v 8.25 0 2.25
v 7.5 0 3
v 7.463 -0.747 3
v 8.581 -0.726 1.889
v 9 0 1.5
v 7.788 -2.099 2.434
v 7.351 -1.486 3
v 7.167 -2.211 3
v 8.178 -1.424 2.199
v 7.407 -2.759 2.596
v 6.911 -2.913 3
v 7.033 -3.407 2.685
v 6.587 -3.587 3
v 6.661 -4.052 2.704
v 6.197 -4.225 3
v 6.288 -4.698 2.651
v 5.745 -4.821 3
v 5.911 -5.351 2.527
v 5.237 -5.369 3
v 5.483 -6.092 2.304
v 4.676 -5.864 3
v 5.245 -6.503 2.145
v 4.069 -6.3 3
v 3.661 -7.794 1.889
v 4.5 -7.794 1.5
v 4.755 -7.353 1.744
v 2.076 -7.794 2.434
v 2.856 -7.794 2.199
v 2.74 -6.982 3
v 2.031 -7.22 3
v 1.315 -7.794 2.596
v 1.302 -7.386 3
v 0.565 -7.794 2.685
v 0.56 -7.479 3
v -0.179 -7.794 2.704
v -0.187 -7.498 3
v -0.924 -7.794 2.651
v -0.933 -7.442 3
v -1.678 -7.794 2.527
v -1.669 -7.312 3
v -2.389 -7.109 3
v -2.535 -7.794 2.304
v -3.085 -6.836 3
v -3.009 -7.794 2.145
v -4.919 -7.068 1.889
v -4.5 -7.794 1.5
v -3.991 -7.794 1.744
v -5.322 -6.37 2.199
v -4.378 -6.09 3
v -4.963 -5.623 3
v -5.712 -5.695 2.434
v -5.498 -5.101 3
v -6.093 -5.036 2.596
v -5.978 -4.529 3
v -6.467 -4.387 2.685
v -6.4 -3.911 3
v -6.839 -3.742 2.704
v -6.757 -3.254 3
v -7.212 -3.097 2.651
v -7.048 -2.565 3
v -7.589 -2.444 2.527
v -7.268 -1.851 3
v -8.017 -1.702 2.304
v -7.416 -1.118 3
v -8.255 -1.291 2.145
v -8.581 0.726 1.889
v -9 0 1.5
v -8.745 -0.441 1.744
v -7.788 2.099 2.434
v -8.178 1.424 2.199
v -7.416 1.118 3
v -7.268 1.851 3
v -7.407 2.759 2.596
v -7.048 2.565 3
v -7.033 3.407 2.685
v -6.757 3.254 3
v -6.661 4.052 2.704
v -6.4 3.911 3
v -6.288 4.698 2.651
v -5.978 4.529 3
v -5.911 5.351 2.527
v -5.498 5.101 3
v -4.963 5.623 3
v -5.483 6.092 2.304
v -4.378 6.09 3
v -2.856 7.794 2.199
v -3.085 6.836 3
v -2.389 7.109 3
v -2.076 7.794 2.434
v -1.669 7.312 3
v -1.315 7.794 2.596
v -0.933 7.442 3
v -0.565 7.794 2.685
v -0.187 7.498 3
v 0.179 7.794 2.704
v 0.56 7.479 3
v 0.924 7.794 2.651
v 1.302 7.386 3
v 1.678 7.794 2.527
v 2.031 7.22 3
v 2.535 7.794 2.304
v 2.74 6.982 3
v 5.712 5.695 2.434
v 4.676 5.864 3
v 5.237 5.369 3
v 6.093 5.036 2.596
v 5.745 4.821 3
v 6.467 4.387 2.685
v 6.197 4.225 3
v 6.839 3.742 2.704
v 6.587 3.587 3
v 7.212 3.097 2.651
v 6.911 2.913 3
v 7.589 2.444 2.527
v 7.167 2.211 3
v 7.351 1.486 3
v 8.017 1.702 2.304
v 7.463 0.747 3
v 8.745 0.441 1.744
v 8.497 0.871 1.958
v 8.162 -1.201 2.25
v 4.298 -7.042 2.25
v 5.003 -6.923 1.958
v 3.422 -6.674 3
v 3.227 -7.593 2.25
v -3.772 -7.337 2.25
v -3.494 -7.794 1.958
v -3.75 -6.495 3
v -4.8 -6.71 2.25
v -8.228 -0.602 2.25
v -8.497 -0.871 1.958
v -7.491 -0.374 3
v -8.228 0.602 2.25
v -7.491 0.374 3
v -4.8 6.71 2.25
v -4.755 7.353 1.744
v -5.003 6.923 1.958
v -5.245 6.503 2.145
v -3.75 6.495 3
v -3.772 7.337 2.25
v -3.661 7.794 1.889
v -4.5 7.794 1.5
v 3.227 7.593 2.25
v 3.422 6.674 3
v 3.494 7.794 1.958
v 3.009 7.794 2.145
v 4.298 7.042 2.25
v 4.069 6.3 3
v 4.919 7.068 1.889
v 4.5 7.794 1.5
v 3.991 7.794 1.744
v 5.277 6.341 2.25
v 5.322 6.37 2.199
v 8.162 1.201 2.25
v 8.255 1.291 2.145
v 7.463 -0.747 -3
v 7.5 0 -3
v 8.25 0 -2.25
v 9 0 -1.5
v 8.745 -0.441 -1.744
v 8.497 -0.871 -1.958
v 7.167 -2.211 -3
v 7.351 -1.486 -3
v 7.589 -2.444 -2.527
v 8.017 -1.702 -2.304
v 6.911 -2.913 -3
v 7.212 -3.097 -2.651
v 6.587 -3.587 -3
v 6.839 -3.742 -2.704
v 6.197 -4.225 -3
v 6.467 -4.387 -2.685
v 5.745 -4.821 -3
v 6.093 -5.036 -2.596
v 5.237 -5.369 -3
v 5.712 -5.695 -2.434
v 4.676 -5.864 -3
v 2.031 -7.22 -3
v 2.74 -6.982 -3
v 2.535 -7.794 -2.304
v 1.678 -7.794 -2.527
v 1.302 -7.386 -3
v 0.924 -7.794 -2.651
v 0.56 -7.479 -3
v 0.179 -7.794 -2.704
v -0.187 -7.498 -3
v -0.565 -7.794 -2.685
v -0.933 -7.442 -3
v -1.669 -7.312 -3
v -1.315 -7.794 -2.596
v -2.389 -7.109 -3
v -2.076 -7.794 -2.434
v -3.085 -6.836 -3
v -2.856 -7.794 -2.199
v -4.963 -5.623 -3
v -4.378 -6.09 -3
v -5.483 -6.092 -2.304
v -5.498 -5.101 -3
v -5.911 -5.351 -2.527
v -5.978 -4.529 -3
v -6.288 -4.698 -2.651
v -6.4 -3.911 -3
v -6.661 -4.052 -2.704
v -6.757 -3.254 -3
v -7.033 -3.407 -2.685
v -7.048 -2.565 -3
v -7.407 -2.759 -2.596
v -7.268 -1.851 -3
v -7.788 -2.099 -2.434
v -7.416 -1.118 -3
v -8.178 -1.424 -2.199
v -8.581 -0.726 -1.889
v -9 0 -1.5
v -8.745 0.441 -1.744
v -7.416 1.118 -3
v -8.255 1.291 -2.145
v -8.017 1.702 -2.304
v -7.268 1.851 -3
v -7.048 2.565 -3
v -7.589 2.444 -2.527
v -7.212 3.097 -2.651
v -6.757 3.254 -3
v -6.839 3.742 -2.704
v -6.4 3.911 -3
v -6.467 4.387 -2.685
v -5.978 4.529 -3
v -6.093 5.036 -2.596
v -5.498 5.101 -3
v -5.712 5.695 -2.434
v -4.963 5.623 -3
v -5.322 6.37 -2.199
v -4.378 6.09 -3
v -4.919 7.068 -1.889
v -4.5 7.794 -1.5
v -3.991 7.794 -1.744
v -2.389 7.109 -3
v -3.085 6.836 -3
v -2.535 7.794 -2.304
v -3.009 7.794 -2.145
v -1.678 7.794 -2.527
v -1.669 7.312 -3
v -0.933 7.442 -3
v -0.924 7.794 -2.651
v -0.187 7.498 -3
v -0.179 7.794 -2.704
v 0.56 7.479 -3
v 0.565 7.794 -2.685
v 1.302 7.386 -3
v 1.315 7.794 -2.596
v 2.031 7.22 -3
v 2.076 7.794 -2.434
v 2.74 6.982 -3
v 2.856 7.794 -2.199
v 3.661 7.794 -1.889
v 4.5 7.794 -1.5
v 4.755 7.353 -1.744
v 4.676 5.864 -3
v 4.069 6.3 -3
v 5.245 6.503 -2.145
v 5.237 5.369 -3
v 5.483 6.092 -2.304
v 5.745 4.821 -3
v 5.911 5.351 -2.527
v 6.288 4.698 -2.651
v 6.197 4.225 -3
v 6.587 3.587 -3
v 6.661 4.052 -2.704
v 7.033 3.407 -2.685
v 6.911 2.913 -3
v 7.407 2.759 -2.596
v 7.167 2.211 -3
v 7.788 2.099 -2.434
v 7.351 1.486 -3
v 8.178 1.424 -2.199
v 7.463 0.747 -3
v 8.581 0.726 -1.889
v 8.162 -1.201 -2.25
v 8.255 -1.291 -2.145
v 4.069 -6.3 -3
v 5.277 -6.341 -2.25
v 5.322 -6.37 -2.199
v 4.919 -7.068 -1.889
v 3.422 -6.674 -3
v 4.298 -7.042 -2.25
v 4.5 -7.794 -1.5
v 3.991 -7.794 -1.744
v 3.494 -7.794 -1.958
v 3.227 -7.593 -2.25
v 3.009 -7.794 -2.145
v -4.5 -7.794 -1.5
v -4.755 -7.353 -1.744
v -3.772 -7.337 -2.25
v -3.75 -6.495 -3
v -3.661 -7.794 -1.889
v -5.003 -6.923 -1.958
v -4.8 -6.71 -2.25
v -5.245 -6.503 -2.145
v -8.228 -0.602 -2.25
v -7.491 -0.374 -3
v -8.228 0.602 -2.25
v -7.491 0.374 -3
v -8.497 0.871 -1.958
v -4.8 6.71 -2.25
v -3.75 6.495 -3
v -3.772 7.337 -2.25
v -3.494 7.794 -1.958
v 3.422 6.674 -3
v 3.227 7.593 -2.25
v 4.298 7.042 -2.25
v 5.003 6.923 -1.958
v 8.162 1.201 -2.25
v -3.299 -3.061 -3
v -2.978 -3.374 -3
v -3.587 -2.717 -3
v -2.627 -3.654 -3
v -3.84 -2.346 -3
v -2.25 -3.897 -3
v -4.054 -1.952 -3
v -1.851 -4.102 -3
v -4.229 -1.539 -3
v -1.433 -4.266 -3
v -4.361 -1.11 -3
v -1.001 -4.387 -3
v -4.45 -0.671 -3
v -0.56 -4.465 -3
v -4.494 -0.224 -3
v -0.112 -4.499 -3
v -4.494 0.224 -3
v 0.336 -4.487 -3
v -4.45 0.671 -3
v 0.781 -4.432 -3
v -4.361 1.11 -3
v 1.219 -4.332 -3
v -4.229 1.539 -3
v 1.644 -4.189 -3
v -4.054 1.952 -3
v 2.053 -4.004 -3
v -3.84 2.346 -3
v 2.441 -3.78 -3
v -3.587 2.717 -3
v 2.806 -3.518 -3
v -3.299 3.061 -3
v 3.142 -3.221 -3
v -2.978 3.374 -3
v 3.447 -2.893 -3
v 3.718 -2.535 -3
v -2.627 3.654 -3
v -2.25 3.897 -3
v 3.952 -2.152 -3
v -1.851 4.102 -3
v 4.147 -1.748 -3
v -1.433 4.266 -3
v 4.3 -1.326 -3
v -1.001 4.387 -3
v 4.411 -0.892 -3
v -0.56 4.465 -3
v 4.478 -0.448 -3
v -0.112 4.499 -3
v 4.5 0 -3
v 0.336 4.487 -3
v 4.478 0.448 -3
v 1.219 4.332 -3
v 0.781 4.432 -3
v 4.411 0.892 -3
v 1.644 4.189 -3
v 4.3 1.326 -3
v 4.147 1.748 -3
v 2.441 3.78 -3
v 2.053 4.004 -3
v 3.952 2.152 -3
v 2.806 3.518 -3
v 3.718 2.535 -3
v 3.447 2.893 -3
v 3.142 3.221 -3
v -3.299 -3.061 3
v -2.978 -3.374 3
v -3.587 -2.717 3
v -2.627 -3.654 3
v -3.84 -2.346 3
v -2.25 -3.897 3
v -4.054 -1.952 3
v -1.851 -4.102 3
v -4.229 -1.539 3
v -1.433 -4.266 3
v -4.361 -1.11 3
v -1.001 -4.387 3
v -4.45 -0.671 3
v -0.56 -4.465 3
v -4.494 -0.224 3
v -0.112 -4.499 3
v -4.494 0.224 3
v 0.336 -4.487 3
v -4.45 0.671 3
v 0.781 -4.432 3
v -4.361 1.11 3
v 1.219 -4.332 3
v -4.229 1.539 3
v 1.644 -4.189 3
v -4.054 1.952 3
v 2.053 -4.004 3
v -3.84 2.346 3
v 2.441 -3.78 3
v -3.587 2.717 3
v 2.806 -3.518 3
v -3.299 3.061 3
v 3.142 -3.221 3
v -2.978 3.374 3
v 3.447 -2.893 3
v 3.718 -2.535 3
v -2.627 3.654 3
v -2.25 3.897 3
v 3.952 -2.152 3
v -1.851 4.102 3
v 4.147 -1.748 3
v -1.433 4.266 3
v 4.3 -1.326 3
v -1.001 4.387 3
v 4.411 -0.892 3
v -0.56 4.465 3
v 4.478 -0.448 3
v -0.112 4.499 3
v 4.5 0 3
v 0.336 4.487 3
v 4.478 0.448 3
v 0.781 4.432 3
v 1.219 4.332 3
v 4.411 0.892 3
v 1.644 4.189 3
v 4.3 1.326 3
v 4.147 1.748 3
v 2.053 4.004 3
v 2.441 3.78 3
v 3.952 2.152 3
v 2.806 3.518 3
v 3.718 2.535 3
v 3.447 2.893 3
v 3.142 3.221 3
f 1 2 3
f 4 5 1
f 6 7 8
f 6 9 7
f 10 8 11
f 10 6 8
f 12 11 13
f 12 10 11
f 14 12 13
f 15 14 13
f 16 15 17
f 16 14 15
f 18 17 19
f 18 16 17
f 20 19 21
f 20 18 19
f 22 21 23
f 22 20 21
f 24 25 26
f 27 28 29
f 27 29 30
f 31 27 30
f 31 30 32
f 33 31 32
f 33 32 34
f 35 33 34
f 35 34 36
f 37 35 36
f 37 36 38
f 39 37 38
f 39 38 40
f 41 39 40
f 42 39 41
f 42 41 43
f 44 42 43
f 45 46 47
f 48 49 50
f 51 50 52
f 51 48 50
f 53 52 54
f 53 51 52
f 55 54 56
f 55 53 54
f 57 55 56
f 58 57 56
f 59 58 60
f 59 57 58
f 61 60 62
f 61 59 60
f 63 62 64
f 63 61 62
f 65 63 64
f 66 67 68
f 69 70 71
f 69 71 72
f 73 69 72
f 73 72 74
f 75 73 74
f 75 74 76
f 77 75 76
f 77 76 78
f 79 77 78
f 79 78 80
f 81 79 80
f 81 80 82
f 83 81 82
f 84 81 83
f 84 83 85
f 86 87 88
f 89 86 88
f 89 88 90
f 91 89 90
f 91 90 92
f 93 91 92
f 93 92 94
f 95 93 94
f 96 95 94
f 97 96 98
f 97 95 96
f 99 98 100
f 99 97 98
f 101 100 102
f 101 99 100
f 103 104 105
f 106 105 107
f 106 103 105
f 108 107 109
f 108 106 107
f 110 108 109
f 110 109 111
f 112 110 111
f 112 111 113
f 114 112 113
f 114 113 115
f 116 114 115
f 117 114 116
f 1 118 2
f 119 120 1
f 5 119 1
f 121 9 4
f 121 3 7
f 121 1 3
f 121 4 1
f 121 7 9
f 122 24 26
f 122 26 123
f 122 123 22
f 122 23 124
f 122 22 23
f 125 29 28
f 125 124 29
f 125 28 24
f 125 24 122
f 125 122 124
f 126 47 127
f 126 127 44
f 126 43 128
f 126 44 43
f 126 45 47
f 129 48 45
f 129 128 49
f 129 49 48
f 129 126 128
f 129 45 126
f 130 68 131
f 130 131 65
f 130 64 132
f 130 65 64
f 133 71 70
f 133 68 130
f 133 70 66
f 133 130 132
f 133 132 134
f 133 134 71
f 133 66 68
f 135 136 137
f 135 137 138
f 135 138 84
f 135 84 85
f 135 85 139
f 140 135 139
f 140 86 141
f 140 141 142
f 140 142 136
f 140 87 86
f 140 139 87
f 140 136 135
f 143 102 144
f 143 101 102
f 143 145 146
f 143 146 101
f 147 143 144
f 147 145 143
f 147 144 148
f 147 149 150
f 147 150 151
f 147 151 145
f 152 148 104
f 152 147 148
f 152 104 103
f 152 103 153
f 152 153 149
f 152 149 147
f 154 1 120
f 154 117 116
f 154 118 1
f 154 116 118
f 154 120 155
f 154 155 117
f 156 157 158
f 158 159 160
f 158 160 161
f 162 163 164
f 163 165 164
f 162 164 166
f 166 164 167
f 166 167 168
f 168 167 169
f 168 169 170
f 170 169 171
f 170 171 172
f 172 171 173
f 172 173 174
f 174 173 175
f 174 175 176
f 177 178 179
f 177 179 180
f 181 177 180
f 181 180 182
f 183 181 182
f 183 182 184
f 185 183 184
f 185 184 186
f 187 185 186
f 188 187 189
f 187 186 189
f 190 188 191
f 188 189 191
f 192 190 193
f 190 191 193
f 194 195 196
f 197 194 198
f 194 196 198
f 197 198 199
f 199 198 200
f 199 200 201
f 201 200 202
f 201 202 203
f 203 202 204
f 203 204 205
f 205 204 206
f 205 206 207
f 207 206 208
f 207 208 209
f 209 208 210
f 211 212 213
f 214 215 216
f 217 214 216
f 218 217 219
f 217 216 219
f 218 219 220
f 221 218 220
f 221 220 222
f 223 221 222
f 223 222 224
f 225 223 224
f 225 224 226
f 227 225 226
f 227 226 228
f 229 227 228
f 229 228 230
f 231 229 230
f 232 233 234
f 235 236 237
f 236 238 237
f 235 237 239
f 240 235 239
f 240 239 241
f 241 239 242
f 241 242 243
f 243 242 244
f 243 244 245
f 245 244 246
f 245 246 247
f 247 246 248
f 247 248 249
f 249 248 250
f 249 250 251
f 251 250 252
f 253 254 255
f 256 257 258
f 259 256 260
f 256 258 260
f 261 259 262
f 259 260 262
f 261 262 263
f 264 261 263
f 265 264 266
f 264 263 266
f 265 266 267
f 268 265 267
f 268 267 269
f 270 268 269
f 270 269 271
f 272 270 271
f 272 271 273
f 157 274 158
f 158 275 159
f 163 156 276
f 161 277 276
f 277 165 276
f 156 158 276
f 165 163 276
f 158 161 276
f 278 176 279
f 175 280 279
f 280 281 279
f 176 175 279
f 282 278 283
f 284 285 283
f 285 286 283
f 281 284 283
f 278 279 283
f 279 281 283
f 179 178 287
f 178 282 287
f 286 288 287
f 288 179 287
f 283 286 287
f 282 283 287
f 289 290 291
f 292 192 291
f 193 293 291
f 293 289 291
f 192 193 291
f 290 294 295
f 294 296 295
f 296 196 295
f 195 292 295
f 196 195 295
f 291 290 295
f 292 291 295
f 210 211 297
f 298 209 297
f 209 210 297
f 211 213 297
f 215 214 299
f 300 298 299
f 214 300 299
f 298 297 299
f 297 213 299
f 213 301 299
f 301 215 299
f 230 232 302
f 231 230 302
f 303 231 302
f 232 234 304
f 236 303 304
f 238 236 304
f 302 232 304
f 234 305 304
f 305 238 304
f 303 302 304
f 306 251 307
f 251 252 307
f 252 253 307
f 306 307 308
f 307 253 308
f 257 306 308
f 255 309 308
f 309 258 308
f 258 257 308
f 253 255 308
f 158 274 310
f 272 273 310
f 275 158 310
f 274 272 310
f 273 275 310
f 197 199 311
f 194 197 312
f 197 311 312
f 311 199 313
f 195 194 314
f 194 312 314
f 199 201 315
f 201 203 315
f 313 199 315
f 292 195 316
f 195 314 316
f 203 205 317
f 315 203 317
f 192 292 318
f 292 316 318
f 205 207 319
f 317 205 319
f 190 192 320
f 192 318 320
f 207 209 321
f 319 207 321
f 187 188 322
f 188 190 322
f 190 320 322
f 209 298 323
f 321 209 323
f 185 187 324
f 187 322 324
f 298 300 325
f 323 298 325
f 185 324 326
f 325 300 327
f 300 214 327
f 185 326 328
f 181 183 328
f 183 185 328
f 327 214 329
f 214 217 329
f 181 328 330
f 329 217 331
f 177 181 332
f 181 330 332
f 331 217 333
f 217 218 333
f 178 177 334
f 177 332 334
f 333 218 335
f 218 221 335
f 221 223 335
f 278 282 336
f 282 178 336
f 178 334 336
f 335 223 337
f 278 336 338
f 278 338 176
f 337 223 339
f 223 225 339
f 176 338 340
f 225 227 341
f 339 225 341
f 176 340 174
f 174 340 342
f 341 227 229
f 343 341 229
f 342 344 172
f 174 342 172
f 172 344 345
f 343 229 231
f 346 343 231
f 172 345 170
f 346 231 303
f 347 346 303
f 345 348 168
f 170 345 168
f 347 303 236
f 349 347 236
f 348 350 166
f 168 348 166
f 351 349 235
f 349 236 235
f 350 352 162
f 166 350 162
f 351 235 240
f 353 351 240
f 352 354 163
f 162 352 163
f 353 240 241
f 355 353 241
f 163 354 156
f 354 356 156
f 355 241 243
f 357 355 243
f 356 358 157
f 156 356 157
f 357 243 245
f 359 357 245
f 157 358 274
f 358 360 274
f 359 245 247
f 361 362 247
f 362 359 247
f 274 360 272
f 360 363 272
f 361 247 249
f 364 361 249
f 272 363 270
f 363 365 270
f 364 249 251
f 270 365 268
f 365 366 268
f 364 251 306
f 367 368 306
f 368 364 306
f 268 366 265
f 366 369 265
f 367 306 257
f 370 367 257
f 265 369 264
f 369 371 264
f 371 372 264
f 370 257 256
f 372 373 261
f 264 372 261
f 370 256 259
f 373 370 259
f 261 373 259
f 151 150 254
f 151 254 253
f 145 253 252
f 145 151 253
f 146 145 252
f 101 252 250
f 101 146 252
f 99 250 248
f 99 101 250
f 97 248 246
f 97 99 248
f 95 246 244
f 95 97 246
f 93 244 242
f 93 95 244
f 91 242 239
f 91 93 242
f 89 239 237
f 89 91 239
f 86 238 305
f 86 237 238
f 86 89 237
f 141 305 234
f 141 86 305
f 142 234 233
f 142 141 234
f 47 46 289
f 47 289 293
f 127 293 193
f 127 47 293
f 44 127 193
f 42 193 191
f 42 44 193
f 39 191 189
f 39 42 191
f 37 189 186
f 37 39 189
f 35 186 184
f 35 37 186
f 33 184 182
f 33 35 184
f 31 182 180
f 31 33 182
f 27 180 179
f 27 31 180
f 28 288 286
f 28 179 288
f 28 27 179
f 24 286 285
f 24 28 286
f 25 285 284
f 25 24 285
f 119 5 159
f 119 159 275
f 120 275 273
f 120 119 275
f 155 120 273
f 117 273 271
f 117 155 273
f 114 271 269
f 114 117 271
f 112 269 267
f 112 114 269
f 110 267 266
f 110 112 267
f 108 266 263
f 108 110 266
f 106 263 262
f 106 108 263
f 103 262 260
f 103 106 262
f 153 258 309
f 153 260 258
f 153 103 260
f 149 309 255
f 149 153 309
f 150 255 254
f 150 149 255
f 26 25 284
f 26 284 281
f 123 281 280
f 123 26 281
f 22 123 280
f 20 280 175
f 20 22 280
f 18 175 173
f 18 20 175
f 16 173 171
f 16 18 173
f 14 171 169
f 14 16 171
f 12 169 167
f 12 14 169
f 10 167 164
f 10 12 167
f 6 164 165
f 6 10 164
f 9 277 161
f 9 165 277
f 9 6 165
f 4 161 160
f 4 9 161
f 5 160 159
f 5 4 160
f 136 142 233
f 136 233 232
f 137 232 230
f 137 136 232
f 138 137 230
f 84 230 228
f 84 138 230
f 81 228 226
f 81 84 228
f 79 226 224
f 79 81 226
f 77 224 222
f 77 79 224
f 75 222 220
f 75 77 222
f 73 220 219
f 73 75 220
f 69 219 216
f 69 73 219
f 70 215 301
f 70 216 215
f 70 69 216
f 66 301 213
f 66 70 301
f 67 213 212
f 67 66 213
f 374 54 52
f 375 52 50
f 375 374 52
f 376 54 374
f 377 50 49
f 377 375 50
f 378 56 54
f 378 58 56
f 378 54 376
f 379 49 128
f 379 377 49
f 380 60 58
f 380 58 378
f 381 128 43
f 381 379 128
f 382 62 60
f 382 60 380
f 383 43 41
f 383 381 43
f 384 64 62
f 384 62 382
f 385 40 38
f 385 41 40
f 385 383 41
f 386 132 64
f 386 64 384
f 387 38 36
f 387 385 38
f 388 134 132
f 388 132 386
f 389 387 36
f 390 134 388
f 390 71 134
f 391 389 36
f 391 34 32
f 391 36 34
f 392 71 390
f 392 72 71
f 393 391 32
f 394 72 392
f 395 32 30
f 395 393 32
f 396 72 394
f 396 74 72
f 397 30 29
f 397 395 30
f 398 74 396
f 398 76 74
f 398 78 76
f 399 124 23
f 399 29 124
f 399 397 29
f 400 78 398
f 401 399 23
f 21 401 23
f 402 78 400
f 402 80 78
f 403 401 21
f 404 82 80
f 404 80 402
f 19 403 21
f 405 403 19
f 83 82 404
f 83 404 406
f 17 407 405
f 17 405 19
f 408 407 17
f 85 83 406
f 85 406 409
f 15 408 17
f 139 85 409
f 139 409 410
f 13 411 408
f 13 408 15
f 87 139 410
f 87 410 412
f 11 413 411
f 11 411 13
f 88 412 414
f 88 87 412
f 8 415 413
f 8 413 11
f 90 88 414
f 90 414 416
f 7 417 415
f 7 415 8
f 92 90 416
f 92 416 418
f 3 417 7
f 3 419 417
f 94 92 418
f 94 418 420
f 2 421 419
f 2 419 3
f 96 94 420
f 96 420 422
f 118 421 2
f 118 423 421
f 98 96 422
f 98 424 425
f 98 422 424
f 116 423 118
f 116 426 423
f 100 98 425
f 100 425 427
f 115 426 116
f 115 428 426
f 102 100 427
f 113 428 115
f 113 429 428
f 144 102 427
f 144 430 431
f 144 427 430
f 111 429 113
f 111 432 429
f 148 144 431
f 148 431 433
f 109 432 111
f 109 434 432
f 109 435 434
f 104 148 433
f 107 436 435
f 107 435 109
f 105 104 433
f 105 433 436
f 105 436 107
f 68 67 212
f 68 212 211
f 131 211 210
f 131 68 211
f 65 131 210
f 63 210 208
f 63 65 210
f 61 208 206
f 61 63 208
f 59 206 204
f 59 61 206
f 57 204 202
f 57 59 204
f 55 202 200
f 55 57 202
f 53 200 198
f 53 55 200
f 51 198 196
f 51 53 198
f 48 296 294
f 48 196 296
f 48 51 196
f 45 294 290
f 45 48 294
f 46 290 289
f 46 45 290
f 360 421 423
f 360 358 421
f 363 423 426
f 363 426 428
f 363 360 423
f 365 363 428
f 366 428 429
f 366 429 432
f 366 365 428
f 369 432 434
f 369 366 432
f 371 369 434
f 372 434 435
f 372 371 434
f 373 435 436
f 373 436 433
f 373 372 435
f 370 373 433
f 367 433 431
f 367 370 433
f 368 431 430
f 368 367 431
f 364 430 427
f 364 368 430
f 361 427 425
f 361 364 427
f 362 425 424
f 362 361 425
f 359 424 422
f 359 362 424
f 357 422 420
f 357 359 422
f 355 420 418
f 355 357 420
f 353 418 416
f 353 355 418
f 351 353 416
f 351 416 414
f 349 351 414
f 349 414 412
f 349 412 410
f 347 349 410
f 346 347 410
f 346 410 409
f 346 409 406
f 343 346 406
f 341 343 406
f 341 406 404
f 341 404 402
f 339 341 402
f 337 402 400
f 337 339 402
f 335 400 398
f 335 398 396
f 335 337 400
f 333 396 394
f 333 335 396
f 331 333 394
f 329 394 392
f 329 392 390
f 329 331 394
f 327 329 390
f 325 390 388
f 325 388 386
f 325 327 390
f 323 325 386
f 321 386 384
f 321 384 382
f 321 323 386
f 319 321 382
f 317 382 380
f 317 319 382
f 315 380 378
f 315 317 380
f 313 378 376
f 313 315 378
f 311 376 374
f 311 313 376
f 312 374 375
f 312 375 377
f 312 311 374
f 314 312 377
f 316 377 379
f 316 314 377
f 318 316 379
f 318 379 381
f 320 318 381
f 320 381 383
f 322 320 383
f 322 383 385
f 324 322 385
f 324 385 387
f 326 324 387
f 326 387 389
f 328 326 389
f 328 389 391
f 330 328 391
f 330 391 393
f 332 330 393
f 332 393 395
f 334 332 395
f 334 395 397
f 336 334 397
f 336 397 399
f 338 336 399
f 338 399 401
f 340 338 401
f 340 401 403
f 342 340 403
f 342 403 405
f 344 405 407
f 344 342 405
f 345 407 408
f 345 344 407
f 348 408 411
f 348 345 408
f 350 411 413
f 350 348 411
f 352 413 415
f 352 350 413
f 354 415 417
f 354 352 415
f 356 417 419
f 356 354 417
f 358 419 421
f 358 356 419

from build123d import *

# Parameters (mm, degrees)
SKETCH1_R           = 4.5
BOSS_EXTRUDE1_DEPTH = 3
SKETCH4_OUTSIDE_W   = 36.912
SKETCH4_OUTSIDE_H   = 34.5
SKETCH4_OUTSIDE_R   = 7.5
CUT_EXTRUDE1_DEPTH  = 6
CUT_EXTRUDE1_TAPER  = 45


with BuildPart() as part:
    # Sketch1 → Boss-Extrude1 (new body, symmetric)
    with BuildSketch(Plane.XY):
        Polygon((4.5, 7.794228634), (-4.5, 7.794228634), (-9, 0), (-4.5, -7.794228634), (4.5, -7.794228634), (9, 0), align=None)
        Circle(SKETCH1_R, mode=Mode.SUBTRACT)
    extrude(amount=BOSS_EXTRUDE1_DEPTH, both=True)

    # Sketch4 outside → Cut-Extrude1 (cut)
    with BuildSketch(Plane.XY.offset(3)):
        Rectangle(SKETCH4_OUTSIDE_W, SKETCH4_OUTSIDE_H)
        Circle(SKETCH4_OUTSIDE_R, mode=Mode.SUBTRACT)
    cut_extrude1 = extrude(amount=-CUT_EXTRUDE1_DEPTH, taper=CUT_EXTRUDE1_TAPER, mode=Mode.SUBTRACT)

    # Mirror1: Cut-Extrude1 across plane
    add(cut_extrude1.mirror(Plane.XY), mode=Mode.SUBTRACT)


solid = part.part
